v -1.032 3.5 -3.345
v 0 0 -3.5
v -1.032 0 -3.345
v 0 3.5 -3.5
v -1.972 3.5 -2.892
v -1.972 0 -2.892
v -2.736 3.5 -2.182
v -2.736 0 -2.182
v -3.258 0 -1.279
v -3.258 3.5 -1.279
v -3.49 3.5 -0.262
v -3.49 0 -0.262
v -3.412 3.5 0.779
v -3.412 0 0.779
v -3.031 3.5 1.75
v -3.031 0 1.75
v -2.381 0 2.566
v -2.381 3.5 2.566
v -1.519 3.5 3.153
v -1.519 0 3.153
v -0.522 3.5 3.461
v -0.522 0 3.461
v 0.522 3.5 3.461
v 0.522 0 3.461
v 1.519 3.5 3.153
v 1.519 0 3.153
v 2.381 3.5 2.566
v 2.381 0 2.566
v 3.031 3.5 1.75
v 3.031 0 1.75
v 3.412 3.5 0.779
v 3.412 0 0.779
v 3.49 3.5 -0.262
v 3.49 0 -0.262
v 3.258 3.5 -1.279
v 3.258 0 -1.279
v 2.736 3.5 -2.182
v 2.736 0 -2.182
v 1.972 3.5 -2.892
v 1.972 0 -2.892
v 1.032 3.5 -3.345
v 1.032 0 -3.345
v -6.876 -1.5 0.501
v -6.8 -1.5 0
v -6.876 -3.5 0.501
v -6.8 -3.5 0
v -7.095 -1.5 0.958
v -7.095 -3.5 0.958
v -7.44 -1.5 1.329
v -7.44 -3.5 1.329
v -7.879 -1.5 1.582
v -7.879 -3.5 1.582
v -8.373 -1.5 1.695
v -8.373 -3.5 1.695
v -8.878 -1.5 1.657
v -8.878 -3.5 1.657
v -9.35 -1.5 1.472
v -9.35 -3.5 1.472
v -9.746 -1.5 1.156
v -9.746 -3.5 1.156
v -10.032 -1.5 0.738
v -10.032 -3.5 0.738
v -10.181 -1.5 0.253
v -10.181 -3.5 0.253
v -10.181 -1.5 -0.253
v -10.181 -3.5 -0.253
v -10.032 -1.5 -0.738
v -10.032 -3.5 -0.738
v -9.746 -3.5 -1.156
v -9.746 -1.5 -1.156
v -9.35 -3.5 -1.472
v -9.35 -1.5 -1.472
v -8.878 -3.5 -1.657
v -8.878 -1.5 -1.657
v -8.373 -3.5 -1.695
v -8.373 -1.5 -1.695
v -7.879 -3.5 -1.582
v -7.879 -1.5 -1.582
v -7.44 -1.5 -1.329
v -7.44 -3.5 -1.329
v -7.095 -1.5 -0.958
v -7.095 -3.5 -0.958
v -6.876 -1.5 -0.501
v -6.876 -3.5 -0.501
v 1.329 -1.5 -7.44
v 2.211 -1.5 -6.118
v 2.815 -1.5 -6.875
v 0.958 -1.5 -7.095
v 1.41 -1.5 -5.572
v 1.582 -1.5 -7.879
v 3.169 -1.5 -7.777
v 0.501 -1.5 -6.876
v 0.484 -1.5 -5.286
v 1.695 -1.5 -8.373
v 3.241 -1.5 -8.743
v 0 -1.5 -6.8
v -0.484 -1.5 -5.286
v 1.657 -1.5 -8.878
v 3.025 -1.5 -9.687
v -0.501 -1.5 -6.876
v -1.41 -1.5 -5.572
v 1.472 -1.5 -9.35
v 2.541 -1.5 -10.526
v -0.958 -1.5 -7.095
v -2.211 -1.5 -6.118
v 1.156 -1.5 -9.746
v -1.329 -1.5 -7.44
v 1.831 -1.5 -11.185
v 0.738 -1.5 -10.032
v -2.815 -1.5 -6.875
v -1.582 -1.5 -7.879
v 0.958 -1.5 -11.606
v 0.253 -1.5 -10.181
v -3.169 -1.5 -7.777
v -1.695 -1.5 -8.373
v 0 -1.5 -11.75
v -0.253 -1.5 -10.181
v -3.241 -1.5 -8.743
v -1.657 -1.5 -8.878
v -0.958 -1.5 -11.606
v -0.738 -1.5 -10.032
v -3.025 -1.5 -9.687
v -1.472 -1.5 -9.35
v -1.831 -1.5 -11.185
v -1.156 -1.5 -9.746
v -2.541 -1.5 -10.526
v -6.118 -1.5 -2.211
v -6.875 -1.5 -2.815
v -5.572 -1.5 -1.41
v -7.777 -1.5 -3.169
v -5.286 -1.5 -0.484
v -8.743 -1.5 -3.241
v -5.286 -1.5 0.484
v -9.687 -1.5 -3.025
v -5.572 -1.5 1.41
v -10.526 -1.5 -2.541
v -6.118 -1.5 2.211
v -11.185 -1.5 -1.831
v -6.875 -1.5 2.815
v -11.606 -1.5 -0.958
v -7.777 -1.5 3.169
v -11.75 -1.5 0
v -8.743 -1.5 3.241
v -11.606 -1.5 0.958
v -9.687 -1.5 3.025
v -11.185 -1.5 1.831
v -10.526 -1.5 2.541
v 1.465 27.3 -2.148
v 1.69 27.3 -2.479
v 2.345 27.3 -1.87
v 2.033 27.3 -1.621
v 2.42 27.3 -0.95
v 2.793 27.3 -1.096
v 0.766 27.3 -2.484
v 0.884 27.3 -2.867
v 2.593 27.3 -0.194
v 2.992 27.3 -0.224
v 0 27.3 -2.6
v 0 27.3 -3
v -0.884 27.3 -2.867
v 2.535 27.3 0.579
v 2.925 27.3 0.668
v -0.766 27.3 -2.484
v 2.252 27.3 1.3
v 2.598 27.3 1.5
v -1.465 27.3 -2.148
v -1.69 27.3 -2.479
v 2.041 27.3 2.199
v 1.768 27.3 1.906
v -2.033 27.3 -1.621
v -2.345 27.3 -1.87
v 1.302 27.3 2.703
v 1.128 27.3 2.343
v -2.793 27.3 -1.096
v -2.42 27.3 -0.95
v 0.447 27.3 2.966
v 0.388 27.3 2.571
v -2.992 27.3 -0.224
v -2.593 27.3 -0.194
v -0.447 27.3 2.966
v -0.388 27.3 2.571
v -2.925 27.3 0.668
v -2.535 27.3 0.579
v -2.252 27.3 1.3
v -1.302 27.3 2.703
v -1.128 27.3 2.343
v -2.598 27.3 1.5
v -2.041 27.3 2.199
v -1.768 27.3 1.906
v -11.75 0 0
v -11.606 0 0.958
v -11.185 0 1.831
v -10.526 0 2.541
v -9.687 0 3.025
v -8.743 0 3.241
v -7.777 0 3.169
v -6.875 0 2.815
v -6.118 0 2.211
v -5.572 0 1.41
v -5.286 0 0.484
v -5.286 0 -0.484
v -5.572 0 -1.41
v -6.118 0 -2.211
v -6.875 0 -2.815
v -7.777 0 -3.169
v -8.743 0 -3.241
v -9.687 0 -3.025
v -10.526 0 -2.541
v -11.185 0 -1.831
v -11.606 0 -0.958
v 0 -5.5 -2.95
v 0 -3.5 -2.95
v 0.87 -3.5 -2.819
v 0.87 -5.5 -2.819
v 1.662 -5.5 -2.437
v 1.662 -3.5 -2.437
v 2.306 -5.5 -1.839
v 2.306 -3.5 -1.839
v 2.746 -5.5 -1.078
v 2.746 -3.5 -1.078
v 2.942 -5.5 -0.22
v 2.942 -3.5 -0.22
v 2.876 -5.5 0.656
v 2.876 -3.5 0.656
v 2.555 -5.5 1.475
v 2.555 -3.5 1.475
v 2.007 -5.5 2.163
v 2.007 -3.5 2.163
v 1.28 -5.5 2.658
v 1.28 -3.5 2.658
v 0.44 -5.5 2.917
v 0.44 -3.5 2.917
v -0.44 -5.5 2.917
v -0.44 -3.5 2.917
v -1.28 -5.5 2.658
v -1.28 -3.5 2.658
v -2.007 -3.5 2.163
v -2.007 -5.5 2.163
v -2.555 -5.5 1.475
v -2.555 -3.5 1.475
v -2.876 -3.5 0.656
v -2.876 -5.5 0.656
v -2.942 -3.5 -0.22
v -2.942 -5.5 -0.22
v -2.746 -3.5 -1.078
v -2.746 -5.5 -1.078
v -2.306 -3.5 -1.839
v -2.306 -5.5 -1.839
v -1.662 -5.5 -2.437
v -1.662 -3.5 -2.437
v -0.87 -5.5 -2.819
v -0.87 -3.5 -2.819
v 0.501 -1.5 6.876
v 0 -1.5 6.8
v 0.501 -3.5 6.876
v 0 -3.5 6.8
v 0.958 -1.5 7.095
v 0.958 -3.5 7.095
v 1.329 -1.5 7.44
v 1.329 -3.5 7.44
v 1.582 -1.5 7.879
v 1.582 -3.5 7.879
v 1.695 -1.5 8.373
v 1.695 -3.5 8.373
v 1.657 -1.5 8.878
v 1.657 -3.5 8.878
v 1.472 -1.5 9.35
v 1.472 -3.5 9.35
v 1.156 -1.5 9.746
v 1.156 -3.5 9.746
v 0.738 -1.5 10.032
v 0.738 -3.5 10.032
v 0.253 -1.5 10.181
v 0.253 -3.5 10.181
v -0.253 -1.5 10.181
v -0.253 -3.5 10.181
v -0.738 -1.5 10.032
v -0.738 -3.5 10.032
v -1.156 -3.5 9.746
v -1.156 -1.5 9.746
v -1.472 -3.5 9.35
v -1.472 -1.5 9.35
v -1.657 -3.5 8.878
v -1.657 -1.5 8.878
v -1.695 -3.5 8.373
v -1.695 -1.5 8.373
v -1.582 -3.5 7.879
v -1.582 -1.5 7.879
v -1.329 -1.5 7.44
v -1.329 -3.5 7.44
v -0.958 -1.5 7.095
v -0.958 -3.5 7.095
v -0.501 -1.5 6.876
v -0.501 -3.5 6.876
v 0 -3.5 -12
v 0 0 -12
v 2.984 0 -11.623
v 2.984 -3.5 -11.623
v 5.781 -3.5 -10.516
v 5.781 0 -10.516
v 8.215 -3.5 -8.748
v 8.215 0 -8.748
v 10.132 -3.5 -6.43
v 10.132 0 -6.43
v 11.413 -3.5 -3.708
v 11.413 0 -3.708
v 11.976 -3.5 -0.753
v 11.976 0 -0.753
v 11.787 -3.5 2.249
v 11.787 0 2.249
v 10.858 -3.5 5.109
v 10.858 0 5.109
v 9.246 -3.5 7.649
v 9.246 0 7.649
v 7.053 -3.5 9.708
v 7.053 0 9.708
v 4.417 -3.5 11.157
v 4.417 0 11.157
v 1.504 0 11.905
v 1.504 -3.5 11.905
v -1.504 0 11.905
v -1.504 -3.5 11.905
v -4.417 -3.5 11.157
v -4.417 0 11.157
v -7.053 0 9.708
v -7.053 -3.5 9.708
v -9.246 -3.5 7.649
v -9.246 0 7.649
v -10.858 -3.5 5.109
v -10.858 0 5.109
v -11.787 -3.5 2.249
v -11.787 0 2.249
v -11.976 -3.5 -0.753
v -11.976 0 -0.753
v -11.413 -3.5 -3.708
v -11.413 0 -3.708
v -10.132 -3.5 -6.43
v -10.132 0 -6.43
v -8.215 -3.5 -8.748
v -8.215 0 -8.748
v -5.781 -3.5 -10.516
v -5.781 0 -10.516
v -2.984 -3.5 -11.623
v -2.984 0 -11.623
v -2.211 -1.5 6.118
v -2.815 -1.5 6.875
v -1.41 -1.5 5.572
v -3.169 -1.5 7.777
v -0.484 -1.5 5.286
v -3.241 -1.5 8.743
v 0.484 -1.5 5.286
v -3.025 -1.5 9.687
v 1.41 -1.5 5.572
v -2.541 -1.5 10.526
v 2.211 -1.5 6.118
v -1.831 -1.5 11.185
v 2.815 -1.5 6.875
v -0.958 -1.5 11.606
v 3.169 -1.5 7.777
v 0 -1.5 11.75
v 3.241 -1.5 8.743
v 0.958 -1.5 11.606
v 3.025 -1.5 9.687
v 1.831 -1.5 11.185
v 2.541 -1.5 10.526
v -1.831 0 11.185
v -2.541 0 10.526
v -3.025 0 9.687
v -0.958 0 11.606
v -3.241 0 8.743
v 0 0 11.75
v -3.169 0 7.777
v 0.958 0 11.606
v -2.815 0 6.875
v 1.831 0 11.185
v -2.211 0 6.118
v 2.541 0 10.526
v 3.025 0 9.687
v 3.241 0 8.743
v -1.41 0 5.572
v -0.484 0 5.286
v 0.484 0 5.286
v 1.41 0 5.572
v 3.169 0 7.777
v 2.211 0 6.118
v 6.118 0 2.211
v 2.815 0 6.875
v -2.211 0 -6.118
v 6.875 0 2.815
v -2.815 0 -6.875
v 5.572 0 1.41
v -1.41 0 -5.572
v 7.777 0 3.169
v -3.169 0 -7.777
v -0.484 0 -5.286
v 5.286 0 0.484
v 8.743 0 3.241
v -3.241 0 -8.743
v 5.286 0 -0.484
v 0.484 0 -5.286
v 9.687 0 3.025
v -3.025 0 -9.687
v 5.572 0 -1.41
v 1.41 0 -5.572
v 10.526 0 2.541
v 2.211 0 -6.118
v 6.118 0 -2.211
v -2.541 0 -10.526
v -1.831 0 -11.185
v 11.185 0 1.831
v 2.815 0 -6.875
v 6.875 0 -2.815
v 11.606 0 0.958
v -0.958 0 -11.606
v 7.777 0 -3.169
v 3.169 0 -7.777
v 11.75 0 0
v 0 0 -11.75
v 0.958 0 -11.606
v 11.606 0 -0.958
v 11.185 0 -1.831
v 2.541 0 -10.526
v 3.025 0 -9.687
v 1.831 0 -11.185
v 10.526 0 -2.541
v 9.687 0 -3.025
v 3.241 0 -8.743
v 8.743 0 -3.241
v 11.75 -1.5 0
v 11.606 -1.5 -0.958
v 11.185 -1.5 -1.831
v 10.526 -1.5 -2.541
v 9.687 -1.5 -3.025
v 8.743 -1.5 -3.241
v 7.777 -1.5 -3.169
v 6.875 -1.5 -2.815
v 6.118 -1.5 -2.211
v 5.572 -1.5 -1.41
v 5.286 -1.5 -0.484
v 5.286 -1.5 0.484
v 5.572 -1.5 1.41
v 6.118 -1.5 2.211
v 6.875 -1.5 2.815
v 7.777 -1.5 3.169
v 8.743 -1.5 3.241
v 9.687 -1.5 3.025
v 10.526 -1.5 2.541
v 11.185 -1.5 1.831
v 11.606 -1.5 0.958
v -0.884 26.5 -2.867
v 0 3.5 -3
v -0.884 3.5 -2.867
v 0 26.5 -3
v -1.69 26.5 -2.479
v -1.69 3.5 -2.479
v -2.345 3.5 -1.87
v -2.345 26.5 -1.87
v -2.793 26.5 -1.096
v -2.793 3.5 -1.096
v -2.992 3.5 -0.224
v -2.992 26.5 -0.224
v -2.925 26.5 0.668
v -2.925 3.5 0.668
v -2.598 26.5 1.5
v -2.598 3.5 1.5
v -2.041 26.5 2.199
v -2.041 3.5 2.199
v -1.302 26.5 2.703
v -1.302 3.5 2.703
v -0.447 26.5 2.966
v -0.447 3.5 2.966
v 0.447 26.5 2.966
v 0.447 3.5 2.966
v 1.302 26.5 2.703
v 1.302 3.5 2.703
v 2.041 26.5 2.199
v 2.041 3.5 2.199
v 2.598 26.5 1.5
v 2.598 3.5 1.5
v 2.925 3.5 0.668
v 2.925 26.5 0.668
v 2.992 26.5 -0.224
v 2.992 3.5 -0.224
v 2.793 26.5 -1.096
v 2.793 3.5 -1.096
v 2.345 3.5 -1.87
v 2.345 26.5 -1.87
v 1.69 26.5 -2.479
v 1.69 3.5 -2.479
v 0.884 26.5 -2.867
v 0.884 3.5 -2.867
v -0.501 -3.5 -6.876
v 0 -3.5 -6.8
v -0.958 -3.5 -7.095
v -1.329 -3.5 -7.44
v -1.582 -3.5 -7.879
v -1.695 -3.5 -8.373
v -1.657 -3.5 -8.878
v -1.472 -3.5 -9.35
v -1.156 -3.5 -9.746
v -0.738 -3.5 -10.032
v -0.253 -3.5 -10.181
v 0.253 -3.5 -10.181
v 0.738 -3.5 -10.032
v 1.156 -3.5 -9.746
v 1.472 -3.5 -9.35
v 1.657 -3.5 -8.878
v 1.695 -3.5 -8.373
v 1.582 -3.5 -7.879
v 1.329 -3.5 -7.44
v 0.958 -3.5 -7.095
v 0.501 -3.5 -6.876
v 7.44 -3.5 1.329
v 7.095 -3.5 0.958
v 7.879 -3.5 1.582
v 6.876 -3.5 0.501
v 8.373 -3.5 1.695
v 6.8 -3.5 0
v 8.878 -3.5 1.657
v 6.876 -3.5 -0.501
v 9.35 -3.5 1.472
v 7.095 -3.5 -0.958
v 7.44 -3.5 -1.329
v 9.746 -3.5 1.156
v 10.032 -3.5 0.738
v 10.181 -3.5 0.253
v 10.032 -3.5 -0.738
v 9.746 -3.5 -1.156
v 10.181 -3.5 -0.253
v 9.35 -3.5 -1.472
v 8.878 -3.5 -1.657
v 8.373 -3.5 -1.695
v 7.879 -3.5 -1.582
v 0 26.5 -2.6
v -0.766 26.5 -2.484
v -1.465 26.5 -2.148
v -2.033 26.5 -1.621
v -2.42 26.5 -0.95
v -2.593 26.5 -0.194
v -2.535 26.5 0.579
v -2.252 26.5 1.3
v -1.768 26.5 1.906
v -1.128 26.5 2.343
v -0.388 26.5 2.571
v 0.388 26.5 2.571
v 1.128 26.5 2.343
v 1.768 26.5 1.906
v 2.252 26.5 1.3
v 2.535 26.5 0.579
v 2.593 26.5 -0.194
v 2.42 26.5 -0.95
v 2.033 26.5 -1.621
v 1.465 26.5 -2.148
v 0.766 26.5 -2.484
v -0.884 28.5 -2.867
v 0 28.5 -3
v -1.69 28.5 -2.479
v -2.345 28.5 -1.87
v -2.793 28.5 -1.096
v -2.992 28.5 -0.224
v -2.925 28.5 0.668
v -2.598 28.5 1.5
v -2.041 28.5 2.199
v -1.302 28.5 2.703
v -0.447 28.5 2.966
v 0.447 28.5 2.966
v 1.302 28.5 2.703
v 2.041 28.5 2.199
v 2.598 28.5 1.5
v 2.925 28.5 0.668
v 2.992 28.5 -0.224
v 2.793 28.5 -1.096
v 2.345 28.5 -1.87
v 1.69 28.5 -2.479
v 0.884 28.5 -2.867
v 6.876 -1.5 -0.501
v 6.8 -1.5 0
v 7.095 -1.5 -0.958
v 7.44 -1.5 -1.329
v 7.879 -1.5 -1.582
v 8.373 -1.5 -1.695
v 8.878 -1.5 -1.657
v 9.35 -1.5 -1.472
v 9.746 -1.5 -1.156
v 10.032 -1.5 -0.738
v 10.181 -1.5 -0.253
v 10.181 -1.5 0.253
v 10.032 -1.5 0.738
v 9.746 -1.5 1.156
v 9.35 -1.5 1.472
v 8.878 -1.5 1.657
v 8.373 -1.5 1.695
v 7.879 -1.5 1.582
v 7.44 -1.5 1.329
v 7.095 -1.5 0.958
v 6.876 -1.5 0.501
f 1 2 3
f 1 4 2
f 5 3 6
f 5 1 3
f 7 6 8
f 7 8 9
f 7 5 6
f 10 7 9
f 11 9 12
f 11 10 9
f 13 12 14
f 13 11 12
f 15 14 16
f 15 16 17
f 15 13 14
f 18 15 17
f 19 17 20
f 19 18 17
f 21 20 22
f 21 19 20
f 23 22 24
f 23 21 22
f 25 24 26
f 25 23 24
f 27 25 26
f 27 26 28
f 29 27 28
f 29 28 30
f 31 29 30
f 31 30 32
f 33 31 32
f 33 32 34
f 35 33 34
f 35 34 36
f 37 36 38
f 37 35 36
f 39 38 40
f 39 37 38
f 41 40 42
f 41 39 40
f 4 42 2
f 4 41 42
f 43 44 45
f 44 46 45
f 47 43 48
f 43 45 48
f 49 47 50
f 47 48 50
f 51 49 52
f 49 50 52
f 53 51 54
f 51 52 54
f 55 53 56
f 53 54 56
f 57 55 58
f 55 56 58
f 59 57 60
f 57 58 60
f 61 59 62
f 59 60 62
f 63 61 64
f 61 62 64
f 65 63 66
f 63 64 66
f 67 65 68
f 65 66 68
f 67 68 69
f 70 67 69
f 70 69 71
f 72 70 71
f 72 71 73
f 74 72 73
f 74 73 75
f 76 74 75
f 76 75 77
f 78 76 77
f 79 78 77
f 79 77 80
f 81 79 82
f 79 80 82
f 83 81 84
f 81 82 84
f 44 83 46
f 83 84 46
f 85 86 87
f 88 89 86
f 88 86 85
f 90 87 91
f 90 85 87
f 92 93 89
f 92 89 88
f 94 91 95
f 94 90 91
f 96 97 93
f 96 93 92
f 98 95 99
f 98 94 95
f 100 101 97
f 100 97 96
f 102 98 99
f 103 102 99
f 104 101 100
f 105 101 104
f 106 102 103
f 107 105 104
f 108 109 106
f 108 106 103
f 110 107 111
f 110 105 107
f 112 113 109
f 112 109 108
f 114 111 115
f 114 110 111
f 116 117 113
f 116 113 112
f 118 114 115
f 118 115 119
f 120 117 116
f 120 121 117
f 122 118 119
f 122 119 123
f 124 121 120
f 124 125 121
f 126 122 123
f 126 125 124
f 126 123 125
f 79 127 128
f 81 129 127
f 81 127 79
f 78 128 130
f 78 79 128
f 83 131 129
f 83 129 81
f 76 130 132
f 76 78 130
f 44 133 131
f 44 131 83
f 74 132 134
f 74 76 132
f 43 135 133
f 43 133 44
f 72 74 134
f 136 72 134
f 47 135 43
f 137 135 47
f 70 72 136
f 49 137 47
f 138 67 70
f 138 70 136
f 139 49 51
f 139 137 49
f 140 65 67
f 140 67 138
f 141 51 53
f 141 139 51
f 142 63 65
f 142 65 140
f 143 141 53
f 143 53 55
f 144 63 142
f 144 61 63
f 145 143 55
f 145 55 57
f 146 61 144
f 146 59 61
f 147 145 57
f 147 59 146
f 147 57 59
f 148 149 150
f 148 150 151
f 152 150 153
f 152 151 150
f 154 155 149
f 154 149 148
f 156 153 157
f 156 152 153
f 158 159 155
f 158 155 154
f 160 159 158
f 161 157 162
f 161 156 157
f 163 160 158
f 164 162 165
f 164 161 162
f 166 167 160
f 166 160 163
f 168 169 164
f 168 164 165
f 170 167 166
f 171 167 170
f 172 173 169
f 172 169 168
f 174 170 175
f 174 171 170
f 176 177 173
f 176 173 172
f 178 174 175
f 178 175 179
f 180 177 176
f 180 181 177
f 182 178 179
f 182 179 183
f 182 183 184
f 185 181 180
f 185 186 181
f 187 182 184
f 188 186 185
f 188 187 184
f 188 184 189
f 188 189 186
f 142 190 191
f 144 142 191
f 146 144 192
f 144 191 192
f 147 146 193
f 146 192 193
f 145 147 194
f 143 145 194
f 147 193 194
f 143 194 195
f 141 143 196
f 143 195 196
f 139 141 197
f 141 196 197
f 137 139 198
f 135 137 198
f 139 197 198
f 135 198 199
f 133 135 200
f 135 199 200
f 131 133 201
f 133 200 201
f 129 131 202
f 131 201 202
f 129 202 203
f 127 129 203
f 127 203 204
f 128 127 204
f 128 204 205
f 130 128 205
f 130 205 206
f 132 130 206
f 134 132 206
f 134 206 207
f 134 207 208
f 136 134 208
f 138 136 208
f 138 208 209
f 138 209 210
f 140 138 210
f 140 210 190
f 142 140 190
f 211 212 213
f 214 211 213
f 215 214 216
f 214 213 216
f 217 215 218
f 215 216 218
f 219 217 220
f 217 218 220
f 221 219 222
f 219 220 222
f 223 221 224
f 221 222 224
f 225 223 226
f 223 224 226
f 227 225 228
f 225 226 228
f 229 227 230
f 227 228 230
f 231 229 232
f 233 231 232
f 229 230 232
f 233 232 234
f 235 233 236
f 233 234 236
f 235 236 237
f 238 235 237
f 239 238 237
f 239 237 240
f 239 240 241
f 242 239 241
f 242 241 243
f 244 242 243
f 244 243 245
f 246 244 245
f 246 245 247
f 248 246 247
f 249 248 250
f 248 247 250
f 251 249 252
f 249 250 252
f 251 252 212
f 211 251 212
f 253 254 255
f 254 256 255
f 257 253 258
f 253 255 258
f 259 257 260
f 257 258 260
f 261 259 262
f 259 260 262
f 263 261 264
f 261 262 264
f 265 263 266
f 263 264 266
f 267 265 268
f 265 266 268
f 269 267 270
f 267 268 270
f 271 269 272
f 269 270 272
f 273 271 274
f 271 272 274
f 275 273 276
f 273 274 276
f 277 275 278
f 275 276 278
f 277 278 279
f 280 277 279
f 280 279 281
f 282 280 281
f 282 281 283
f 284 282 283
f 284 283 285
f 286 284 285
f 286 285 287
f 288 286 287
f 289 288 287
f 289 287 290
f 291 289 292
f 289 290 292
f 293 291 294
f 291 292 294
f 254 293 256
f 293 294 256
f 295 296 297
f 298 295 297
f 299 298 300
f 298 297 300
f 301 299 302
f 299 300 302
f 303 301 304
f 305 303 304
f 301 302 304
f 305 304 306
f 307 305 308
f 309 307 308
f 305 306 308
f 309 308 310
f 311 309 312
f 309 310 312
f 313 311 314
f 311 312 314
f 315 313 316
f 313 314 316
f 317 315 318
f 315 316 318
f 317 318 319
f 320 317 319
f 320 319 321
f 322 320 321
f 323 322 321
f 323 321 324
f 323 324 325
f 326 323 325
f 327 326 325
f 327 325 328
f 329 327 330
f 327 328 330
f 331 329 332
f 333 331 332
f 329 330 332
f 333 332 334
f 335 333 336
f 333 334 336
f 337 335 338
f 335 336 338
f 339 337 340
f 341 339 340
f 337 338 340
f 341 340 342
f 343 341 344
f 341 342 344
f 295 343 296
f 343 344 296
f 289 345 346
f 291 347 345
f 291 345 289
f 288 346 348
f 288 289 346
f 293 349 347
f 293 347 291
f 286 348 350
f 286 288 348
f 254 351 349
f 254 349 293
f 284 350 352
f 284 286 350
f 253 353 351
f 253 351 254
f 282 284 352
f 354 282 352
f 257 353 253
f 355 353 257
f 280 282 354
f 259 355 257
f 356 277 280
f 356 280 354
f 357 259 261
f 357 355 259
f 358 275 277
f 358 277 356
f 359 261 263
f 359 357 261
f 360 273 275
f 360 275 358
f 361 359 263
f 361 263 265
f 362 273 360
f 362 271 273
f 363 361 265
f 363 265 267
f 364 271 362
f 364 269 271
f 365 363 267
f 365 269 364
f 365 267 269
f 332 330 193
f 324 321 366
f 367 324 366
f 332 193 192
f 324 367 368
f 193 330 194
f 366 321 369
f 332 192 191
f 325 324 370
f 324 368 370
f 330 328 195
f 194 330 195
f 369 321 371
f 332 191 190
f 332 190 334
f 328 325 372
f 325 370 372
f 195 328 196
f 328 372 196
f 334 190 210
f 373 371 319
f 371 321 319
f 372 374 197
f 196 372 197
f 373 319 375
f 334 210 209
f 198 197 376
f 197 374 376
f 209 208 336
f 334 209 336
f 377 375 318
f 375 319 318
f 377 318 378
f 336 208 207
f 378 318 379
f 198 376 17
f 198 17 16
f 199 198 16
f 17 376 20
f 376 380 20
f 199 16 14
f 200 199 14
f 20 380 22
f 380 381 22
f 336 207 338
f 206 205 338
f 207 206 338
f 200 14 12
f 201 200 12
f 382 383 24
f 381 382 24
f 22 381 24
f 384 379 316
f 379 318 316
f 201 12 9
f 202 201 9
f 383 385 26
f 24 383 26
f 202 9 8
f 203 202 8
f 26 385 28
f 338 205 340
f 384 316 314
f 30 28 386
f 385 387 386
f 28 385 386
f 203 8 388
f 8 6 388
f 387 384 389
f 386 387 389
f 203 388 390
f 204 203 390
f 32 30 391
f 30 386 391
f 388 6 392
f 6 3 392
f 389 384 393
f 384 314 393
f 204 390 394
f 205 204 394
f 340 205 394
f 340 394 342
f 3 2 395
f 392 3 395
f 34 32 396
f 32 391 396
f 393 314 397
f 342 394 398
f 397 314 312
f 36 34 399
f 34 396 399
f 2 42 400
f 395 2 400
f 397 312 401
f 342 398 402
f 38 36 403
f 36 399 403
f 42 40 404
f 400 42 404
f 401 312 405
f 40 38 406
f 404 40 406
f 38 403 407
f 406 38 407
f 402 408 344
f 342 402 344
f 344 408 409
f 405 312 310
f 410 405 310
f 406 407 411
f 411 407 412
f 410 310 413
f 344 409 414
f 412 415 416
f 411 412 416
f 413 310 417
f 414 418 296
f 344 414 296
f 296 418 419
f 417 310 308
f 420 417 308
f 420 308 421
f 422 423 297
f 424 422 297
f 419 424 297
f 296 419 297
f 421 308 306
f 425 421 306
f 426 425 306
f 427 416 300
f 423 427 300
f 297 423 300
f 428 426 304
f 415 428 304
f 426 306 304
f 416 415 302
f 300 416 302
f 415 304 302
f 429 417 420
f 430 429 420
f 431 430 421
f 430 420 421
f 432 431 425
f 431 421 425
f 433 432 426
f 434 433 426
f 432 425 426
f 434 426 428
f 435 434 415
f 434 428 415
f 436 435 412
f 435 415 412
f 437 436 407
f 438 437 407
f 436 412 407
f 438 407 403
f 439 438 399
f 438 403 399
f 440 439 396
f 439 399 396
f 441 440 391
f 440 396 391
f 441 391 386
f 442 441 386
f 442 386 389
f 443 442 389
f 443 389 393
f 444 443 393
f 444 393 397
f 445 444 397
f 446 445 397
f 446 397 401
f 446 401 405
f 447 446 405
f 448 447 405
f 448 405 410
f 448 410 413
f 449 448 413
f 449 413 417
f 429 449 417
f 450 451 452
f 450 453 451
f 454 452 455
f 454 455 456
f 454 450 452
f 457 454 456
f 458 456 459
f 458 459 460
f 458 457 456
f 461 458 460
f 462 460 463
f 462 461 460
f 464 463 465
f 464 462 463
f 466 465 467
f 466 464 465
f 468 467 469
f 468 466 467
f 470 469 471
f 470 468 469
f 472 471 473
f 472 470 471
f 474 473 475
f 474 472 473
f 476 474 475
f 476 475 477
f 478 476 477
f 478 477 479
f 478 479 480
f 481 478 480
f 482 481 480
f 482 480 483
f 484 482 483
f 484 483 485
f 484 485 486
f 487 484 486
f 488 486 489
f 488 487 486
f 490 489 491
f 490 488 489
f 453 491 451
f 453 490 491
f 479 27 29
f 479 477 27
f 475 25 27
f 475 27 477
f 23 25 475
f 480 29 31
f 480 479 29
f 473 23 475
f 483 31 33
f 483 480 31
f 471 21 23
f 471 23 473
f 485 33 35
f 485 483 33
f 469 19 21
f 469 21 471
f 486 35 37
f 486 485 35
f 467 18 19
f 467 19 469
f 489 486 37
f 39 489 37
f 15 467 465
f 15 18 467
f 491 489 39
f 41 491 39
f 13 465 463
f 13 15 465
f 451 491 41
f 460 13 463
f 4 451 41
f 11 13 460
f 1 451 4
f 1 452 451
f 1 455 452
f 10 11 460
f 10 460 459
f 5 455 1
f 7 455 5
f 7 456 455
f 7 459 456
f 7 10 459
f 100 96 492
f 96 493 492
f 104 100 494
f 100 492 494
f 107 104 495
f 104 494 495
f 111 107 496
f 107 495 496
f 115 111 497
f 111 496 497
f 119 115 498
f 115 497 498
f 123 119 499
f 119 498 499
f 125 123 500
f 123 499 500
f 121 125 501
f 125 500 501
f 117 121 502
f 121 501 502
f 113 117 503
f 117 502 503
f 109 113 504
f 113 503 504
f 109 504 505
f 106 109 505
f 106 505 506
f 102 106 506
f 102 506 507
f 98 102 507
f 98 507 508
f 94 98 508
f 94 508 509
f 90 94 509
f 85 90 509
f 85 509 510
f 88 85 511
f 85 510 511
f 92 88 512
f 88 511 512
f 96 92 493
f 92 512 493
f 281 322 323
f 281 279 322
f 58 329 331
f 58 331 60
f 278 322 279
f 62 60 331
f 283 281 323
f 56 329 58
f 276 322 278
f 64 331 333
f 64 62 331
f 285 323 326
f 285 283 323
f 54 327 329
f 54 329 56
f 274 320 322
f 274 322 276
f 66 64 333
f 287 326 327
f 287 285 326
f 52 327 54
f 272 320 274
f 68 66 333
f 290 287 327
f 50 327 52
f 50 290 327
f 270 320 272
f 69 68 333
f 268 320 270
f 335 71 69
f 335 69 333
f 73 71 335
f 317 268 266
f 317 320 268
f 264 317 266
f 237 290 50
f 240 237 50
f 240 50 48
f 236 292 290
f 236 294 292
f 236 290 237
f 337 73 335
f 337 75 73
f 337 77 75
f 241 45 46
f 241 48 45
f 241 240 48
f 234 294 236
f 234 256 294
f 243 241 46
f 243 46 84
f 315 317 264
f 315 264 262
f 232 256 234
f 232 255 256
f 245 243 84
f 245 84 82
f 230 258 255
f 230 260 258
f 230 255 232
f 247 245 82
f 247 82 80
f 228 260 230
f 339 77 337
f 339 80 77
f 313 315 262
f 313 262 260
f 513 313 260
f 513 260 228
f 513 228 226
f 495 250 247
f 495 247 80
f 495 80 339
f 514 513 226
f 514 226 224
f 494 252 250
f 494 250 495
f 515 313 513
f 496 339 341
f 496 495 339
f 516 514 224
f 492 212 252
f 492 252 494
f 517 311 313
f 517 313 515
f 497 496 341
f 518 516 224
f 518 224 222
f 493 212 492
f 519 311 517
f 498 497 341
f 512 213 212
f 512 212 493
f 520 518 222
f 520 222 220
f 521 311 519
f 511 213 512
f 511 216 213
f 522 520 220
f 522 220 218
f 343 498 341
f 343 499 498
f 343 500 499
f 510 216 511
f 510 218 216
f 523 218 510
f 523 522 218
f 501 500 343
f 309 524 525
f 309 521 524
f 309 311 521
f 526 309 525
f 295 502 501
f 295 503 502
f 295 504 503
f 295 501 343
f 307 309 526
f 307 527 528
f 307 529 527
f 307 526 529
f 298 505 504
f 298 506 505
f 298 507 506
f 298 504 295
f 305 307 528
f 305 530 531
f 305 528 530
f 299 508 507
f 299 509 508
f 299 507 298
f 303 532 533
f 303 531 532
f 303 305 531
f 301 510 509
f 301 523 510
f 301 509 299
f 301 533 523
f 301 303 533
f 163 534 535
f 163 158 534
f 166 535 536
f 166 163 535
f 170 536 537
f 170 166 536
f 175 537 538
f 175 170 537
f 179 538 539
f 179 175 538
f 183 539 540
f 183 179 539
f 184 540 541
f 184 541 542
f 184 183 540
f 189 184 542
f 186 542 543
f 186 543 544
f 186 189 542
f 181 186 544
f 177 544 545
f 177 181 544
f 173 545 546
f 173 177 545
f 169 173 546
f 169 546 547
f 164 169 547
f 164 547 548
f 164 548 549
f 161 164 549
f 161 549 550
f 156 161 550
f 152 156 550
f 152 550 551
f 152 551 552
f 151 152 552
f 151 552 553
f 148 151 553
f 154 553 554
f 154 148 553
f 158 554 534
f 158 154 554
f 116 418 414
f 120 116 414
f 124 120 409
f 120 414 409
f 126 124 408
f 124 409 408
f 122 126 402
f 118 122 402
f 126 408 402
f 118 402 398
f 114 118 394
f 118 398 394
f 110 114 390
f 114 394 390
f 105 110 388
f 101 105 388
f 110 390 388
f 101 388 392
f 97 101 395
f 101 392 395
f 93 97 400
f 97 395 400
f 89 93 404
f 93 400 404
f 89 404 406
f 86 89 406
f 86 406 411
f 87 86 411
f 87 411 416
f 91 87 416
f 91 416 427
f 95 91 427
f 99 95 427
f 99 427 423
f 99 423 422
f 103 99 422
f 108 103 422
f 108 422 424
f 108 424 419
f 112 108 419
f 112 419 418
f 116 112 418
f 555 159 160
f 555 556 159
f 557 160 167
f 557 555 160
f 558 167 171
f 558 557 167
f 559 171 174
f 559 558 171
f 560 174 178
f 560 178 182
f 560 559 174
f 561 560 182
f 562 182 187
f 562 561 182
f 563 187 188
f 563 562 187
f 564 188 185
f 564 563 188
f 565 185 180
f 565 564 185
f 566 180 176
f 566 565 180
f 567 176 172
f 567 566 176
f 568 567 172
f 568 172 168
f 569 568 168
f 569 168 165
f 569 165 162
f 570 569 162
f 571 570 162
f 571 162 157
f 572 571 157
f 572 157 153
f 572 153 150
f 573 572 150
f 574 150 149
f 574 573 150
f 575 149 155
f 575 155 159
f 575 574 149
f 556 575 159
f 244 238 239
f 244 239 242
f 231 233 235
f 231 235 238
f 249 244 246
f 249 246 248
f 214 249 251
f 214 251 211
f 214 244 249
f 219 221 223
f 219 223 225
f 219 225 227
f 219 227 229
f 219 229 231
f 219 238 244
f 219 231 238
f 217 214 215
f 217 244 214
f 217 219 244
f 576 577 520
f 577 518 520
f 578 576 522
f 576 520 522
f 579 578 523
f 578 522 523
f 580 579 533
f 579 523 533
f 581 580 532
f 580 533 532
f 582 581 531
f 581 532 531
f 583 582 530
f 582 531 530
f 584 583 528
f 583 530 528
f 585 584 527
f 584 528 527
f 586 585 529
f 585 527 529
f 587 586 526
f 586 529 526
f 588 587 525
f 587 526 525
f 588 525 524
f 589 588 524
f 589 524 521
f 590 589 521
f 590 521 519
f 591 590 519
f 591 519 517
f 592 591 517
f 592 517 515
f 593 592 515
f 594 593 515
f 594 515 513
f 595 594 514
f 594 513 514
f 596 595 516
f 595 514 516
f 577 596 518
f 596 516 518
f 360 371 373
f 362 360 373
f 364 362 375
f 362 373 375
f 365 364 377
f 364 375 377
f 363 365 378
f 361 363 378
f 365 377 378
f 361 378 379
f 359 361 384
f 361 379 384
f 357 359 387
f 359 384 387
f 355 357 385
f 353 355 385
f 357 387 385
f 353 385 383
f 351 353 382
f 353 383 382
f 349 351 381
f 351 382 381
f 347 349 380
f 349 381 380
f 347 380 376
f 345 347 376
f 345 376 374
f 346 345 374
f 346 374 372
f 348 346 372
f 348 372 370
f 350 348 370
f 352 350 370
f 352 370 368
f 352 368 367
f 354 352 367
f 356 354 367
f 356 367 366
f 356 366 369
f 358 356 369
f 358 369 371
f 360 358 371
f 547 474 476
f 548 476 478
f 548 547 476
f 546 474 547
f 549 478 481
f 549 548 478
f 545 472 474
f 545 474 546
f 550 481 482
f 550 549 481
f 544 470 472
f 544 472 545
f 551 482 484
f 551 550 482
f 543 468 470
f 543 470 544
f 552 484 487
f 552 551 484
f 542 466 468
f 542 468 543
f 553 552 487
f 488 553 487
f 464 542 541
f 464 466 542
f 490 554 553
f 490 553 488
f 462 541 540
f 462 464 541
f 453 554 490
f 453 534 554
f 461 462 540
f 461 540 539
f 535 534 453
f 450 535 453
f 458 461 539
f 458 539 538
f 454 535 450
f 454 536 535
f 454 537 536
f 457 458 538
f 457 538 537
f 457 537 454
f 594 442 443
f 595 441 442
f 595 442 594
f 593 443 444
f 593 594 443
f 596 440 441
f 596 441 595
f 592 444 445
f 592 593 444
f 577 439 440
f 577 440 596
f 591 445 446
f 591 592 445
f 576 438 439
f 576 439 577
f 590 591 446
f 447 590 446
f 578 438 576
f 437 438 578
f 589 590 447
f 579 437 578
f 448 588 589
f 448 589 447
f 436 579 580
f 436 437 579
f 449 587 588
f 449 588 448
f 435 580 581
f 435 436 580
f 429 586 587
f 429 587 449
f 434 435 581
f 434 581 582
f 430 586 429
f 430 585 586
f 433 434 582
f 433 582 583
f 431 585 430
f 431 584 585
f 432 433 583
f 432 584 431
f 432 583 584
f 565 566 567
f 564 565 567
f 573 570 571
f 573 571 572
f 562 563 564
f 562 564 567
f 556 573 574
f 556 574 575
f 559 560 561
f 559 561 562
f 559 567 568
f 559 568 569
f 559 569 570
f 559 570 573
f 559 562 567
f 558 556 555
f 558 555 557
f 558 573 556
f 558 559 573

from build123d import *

# Parameters (mm, degrees)
SKETCH_2_R                   = 12
EXTRUDE_1_DEPTH              = 3.5
SKETCH_3_R                   = 2.95
EXTRUDE_2_DEPTH              = 2
HOLE_WIZARD_M3_1_D           = 3.4
HOLE_WIZARD_M3_1_CBORE_D     = 6.5
HOLE_WIZARD_M3_1_CBORE_DEPTH = 1.5
PATTERN_CIRCULAR_1_COUNT     = 4


with BuildPart() as part:
    # 草图1 → 旋转1 (revolve)
    with BuildSketch(Plane.XY, mode=Mode.PRIVATE) as revolve_1_sk:
        Polygon((3, 27.3), (3, 28.5), (0, 28.5), (0, 0), (3.5, 0), (3.5, 3.5), (3, 3.5), (3, 26.5), (2.6, 26.5), (2.6, 27.3), align=None)
    revolve(revolve_1_sk.sketch.rotate(Axis((0, 0, 0), (0, 1, 0)), 90), axis=Axis((0, 0, 0), (0, 1, 0)))

    # 草图2 → 凸台-拉伸1 (add)
    with BuildSketch(Plane.XZ):
        with Locations(Location((0, 0, 0), (0, 0, 270))):
            Circle(SKETCH_2_R)
    extrude(amount=EXTRUDE_1_DEPTH)

    # 草图3 → 凸台-拉伸2 (add)
    with BuildSketch(Plane.XZ.offset(3.5)):
        with Locations(Location((0, 0, 0), (0, 0, 270))):
            Circle(SKETCH_3_R)
    extrude(amount=EXTRUDE_2_DEPTH)

    # M3 六角凹头螺钉的柱形沉头孔1 (through all)
    with Locations(Plane(origin=(0, 0, 0), x_dir=(1, 0, 0), z_dir=(0, 1, 0))):
        with Locations((8.5, 0)):
            hole_wizard_m3_1 = CounterBoreHole(HOLE_WIZARD_M3_1_D / 2, HOLE_WIZARD_M3_1_CBORE_D / 2, HOLE_WIZARD_M3_1_CBORE_DEPTH)

    # 阵列(圆周)1: M3 六角凹头螺钉的柱形沉头孔1 ×4 about axis
    pattern_circular_1_axis = Axis((0, 0, 0), (0, 1, 0))
    for i in range(1, PATTERN_CIRCULAR_1_COUNT):
        add(hole_wizard_m3_1.rotate(pattern_circular_1_axis, i * 360 / PATTERN_CIRCULAR_1_COUNT), mode=Mode.SUBTRACT)


solid = part.part
